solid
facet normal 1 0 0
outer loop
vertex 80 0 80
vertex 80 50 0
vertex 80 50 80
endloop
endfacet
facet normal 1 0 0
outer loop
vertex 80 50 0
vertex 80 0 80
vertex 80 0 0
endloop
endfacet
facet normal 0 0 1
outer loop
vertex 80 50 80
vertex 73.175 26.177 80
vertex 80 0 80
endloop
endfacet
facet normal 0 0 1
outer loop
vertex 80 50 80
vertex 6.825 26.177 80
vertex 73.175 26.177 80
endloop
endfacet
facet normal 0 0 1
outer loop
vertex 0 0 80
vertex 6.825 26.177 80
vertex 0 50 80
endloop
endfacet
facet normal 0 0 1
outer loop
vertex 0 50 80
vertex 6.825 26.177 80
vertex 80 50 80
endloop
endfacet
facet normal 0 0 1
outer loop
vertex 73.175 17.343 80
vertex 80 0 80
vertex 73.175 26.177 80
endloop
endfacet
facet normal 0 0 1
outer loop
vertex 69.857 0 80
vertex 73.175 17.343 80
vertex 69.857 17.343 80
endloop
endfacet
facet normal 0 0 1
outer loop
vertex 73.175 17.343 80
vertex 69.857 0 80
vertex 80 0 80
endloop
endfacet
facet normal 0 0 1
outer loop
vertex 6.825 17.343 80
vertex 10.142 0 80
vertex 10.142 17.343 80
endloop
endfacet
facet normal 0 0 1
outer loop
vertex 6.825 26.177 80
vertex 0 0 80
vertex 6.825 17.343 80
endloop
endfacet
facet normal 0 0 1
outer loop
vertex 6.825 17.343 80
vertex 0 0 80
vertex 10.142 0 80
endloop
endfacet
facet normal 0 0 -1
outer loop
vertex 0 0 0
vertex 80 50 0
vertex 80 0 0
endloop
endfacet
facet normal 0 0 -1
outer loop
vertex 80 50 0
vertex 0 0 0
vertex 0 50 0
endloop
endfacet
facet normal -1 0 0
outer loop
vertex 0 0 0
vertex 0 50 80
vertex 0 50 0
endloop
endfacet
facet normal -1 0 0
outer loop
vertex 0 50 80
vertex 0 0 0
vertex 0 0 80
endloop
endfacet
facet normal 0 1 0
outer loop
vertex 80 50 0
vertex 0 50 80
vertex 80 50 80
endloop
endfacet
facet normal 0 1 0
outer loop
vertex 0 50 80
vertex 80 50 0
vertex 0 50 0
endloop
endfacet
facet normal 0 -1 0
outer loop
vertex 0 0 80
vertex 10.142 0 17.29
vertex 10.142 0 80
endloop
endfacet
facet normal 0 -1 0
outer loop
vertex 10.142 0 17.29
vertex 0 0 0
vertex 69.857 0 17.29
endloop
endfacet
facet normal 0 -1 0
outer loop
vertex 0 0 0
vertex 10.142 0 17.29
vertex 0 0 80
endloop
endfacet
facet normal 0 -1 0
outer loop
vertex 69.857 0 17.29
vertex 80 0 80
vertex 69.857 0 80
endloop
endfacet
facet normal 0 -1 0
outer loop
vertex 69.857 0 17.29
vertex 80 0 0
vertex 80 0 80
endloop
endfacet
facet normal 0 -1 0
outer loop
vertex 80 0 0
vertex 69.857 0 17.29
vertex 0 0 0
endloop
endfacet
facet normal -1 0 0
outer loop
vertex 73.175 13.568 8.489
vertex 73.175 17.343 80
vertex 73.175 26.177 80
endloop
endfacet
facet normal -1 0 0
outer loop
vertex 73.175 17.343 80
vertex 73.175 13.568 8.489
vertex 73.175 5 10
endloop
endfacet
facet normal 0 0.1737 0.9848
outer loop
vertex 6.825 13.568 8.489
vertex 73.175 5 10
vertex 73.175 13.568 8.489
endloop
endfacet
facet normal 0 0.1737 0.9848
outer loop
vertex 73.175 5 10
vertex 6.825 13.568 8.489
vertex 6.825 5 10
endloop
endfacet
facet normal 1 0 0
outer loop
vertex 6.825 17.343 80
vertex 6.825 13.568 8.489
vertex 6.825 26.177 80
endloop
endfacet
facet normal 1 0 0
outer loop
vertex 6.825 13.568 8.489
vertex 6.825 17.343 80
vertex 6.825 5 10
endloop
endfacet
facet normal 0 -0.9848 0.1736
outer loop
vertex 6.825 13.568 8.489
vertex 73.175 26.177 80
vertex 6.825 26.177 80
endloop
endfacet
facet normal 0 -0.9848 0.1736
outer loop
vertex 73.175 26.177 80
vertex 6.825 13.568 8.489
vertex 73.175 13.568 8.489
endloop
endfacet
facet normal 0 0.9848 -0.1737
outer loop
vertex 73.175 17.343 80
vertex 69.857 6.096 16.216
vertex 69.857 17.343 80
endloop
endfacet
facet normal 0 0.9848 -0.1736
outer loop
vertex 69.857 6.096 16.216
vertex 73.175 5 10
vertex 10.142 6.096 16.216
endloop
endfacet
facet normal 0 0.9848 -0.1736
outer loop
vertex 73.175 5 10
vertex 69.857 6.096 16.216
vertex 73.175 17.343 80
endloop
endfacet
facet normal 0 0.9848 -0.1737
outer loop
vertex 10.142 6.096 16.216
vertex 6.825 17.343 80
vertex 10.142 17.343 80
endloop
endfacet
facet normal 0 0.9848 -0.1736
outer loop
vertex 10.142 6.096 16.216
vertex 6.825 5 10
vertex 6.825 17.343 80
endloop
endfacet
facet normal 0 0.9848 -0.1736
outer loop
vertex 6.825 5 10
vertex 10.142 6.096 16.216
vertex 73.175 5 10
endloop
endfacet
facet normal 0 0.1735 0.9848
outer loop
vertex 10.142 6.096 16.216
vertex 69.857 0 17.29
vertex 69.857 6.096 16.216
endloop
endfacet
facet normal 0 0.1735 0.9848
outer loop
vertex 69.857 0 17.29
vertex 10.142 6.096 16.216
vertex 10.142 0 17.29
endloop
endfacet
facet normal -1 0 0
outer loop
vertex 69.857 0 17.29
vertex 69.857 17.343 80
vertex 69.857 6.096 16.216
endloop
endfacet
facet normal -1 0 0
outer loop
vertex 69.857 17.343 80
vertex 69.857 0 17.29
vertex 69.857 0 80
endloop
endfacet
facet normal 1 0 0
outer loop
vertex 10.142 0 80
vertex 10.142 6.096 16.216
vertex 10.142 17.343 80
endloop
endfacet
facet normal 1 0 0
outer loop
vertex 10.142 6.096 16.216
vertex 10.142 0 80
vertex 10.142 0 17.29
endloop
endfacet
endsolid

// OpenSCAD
//Customizable Phone Stand
//Height of the phone //default 125.45
phone_height = 125.45;
//Width of the phone //default 66.35
phone_width = 66.35; 
//Thickness of the phone //default 8.7
phone_thickness = 8.7;  

//Height of the stand //default 80
stand_height = 80; //[30:120]
//Width of the stand //default 80
stand_width = 80; //[60:200]
//Thickness of the stand //default 50
stand_thickness = 50; //[35:100]

//Angle at which the phone stands //default 350
phone_stand_angle = 350; //[335:360]
//The height from the bottom of the stand, to where the phone begins //default 10
phone_stand_min_height = 10; //[2:60]
//From the front of the stand to where the phone starts //default 5
phone_stand_to_back = 5; //[2 : 20]
//to hold back the phone //default 0.9
holdback = 0.9;
//not used at this time
holdback_multiplier = 10; 

//Make!
phone_stand();

module phone_stand(){
  difference(){
    cube([stand_width,stand_thickness,stand_height]);
    //The Phone
    translate([stand_width/2 - phone_width/2,phone_stand_to_back,phone_stand_min_height]) 
    rotate(phone_stand_angle,[1,0,0]) 
    cube([phone_width,phone_thickness,phone_height]);
    //The Holdback
    translate([stand_width/2 - phone_width*holdback/2,phone_stand_to_back+(phone_thickness/2)-(phone_thickness*5*holdback),phone_stand_min_height + phone_height - (phone_height*holdback)]) 
    rotate(phone_stand_angle,[1,0,0]) 
    cube([phone_width*holdback,phone_thickness*5*holdback,phone_height*holdback]);
  }
}
